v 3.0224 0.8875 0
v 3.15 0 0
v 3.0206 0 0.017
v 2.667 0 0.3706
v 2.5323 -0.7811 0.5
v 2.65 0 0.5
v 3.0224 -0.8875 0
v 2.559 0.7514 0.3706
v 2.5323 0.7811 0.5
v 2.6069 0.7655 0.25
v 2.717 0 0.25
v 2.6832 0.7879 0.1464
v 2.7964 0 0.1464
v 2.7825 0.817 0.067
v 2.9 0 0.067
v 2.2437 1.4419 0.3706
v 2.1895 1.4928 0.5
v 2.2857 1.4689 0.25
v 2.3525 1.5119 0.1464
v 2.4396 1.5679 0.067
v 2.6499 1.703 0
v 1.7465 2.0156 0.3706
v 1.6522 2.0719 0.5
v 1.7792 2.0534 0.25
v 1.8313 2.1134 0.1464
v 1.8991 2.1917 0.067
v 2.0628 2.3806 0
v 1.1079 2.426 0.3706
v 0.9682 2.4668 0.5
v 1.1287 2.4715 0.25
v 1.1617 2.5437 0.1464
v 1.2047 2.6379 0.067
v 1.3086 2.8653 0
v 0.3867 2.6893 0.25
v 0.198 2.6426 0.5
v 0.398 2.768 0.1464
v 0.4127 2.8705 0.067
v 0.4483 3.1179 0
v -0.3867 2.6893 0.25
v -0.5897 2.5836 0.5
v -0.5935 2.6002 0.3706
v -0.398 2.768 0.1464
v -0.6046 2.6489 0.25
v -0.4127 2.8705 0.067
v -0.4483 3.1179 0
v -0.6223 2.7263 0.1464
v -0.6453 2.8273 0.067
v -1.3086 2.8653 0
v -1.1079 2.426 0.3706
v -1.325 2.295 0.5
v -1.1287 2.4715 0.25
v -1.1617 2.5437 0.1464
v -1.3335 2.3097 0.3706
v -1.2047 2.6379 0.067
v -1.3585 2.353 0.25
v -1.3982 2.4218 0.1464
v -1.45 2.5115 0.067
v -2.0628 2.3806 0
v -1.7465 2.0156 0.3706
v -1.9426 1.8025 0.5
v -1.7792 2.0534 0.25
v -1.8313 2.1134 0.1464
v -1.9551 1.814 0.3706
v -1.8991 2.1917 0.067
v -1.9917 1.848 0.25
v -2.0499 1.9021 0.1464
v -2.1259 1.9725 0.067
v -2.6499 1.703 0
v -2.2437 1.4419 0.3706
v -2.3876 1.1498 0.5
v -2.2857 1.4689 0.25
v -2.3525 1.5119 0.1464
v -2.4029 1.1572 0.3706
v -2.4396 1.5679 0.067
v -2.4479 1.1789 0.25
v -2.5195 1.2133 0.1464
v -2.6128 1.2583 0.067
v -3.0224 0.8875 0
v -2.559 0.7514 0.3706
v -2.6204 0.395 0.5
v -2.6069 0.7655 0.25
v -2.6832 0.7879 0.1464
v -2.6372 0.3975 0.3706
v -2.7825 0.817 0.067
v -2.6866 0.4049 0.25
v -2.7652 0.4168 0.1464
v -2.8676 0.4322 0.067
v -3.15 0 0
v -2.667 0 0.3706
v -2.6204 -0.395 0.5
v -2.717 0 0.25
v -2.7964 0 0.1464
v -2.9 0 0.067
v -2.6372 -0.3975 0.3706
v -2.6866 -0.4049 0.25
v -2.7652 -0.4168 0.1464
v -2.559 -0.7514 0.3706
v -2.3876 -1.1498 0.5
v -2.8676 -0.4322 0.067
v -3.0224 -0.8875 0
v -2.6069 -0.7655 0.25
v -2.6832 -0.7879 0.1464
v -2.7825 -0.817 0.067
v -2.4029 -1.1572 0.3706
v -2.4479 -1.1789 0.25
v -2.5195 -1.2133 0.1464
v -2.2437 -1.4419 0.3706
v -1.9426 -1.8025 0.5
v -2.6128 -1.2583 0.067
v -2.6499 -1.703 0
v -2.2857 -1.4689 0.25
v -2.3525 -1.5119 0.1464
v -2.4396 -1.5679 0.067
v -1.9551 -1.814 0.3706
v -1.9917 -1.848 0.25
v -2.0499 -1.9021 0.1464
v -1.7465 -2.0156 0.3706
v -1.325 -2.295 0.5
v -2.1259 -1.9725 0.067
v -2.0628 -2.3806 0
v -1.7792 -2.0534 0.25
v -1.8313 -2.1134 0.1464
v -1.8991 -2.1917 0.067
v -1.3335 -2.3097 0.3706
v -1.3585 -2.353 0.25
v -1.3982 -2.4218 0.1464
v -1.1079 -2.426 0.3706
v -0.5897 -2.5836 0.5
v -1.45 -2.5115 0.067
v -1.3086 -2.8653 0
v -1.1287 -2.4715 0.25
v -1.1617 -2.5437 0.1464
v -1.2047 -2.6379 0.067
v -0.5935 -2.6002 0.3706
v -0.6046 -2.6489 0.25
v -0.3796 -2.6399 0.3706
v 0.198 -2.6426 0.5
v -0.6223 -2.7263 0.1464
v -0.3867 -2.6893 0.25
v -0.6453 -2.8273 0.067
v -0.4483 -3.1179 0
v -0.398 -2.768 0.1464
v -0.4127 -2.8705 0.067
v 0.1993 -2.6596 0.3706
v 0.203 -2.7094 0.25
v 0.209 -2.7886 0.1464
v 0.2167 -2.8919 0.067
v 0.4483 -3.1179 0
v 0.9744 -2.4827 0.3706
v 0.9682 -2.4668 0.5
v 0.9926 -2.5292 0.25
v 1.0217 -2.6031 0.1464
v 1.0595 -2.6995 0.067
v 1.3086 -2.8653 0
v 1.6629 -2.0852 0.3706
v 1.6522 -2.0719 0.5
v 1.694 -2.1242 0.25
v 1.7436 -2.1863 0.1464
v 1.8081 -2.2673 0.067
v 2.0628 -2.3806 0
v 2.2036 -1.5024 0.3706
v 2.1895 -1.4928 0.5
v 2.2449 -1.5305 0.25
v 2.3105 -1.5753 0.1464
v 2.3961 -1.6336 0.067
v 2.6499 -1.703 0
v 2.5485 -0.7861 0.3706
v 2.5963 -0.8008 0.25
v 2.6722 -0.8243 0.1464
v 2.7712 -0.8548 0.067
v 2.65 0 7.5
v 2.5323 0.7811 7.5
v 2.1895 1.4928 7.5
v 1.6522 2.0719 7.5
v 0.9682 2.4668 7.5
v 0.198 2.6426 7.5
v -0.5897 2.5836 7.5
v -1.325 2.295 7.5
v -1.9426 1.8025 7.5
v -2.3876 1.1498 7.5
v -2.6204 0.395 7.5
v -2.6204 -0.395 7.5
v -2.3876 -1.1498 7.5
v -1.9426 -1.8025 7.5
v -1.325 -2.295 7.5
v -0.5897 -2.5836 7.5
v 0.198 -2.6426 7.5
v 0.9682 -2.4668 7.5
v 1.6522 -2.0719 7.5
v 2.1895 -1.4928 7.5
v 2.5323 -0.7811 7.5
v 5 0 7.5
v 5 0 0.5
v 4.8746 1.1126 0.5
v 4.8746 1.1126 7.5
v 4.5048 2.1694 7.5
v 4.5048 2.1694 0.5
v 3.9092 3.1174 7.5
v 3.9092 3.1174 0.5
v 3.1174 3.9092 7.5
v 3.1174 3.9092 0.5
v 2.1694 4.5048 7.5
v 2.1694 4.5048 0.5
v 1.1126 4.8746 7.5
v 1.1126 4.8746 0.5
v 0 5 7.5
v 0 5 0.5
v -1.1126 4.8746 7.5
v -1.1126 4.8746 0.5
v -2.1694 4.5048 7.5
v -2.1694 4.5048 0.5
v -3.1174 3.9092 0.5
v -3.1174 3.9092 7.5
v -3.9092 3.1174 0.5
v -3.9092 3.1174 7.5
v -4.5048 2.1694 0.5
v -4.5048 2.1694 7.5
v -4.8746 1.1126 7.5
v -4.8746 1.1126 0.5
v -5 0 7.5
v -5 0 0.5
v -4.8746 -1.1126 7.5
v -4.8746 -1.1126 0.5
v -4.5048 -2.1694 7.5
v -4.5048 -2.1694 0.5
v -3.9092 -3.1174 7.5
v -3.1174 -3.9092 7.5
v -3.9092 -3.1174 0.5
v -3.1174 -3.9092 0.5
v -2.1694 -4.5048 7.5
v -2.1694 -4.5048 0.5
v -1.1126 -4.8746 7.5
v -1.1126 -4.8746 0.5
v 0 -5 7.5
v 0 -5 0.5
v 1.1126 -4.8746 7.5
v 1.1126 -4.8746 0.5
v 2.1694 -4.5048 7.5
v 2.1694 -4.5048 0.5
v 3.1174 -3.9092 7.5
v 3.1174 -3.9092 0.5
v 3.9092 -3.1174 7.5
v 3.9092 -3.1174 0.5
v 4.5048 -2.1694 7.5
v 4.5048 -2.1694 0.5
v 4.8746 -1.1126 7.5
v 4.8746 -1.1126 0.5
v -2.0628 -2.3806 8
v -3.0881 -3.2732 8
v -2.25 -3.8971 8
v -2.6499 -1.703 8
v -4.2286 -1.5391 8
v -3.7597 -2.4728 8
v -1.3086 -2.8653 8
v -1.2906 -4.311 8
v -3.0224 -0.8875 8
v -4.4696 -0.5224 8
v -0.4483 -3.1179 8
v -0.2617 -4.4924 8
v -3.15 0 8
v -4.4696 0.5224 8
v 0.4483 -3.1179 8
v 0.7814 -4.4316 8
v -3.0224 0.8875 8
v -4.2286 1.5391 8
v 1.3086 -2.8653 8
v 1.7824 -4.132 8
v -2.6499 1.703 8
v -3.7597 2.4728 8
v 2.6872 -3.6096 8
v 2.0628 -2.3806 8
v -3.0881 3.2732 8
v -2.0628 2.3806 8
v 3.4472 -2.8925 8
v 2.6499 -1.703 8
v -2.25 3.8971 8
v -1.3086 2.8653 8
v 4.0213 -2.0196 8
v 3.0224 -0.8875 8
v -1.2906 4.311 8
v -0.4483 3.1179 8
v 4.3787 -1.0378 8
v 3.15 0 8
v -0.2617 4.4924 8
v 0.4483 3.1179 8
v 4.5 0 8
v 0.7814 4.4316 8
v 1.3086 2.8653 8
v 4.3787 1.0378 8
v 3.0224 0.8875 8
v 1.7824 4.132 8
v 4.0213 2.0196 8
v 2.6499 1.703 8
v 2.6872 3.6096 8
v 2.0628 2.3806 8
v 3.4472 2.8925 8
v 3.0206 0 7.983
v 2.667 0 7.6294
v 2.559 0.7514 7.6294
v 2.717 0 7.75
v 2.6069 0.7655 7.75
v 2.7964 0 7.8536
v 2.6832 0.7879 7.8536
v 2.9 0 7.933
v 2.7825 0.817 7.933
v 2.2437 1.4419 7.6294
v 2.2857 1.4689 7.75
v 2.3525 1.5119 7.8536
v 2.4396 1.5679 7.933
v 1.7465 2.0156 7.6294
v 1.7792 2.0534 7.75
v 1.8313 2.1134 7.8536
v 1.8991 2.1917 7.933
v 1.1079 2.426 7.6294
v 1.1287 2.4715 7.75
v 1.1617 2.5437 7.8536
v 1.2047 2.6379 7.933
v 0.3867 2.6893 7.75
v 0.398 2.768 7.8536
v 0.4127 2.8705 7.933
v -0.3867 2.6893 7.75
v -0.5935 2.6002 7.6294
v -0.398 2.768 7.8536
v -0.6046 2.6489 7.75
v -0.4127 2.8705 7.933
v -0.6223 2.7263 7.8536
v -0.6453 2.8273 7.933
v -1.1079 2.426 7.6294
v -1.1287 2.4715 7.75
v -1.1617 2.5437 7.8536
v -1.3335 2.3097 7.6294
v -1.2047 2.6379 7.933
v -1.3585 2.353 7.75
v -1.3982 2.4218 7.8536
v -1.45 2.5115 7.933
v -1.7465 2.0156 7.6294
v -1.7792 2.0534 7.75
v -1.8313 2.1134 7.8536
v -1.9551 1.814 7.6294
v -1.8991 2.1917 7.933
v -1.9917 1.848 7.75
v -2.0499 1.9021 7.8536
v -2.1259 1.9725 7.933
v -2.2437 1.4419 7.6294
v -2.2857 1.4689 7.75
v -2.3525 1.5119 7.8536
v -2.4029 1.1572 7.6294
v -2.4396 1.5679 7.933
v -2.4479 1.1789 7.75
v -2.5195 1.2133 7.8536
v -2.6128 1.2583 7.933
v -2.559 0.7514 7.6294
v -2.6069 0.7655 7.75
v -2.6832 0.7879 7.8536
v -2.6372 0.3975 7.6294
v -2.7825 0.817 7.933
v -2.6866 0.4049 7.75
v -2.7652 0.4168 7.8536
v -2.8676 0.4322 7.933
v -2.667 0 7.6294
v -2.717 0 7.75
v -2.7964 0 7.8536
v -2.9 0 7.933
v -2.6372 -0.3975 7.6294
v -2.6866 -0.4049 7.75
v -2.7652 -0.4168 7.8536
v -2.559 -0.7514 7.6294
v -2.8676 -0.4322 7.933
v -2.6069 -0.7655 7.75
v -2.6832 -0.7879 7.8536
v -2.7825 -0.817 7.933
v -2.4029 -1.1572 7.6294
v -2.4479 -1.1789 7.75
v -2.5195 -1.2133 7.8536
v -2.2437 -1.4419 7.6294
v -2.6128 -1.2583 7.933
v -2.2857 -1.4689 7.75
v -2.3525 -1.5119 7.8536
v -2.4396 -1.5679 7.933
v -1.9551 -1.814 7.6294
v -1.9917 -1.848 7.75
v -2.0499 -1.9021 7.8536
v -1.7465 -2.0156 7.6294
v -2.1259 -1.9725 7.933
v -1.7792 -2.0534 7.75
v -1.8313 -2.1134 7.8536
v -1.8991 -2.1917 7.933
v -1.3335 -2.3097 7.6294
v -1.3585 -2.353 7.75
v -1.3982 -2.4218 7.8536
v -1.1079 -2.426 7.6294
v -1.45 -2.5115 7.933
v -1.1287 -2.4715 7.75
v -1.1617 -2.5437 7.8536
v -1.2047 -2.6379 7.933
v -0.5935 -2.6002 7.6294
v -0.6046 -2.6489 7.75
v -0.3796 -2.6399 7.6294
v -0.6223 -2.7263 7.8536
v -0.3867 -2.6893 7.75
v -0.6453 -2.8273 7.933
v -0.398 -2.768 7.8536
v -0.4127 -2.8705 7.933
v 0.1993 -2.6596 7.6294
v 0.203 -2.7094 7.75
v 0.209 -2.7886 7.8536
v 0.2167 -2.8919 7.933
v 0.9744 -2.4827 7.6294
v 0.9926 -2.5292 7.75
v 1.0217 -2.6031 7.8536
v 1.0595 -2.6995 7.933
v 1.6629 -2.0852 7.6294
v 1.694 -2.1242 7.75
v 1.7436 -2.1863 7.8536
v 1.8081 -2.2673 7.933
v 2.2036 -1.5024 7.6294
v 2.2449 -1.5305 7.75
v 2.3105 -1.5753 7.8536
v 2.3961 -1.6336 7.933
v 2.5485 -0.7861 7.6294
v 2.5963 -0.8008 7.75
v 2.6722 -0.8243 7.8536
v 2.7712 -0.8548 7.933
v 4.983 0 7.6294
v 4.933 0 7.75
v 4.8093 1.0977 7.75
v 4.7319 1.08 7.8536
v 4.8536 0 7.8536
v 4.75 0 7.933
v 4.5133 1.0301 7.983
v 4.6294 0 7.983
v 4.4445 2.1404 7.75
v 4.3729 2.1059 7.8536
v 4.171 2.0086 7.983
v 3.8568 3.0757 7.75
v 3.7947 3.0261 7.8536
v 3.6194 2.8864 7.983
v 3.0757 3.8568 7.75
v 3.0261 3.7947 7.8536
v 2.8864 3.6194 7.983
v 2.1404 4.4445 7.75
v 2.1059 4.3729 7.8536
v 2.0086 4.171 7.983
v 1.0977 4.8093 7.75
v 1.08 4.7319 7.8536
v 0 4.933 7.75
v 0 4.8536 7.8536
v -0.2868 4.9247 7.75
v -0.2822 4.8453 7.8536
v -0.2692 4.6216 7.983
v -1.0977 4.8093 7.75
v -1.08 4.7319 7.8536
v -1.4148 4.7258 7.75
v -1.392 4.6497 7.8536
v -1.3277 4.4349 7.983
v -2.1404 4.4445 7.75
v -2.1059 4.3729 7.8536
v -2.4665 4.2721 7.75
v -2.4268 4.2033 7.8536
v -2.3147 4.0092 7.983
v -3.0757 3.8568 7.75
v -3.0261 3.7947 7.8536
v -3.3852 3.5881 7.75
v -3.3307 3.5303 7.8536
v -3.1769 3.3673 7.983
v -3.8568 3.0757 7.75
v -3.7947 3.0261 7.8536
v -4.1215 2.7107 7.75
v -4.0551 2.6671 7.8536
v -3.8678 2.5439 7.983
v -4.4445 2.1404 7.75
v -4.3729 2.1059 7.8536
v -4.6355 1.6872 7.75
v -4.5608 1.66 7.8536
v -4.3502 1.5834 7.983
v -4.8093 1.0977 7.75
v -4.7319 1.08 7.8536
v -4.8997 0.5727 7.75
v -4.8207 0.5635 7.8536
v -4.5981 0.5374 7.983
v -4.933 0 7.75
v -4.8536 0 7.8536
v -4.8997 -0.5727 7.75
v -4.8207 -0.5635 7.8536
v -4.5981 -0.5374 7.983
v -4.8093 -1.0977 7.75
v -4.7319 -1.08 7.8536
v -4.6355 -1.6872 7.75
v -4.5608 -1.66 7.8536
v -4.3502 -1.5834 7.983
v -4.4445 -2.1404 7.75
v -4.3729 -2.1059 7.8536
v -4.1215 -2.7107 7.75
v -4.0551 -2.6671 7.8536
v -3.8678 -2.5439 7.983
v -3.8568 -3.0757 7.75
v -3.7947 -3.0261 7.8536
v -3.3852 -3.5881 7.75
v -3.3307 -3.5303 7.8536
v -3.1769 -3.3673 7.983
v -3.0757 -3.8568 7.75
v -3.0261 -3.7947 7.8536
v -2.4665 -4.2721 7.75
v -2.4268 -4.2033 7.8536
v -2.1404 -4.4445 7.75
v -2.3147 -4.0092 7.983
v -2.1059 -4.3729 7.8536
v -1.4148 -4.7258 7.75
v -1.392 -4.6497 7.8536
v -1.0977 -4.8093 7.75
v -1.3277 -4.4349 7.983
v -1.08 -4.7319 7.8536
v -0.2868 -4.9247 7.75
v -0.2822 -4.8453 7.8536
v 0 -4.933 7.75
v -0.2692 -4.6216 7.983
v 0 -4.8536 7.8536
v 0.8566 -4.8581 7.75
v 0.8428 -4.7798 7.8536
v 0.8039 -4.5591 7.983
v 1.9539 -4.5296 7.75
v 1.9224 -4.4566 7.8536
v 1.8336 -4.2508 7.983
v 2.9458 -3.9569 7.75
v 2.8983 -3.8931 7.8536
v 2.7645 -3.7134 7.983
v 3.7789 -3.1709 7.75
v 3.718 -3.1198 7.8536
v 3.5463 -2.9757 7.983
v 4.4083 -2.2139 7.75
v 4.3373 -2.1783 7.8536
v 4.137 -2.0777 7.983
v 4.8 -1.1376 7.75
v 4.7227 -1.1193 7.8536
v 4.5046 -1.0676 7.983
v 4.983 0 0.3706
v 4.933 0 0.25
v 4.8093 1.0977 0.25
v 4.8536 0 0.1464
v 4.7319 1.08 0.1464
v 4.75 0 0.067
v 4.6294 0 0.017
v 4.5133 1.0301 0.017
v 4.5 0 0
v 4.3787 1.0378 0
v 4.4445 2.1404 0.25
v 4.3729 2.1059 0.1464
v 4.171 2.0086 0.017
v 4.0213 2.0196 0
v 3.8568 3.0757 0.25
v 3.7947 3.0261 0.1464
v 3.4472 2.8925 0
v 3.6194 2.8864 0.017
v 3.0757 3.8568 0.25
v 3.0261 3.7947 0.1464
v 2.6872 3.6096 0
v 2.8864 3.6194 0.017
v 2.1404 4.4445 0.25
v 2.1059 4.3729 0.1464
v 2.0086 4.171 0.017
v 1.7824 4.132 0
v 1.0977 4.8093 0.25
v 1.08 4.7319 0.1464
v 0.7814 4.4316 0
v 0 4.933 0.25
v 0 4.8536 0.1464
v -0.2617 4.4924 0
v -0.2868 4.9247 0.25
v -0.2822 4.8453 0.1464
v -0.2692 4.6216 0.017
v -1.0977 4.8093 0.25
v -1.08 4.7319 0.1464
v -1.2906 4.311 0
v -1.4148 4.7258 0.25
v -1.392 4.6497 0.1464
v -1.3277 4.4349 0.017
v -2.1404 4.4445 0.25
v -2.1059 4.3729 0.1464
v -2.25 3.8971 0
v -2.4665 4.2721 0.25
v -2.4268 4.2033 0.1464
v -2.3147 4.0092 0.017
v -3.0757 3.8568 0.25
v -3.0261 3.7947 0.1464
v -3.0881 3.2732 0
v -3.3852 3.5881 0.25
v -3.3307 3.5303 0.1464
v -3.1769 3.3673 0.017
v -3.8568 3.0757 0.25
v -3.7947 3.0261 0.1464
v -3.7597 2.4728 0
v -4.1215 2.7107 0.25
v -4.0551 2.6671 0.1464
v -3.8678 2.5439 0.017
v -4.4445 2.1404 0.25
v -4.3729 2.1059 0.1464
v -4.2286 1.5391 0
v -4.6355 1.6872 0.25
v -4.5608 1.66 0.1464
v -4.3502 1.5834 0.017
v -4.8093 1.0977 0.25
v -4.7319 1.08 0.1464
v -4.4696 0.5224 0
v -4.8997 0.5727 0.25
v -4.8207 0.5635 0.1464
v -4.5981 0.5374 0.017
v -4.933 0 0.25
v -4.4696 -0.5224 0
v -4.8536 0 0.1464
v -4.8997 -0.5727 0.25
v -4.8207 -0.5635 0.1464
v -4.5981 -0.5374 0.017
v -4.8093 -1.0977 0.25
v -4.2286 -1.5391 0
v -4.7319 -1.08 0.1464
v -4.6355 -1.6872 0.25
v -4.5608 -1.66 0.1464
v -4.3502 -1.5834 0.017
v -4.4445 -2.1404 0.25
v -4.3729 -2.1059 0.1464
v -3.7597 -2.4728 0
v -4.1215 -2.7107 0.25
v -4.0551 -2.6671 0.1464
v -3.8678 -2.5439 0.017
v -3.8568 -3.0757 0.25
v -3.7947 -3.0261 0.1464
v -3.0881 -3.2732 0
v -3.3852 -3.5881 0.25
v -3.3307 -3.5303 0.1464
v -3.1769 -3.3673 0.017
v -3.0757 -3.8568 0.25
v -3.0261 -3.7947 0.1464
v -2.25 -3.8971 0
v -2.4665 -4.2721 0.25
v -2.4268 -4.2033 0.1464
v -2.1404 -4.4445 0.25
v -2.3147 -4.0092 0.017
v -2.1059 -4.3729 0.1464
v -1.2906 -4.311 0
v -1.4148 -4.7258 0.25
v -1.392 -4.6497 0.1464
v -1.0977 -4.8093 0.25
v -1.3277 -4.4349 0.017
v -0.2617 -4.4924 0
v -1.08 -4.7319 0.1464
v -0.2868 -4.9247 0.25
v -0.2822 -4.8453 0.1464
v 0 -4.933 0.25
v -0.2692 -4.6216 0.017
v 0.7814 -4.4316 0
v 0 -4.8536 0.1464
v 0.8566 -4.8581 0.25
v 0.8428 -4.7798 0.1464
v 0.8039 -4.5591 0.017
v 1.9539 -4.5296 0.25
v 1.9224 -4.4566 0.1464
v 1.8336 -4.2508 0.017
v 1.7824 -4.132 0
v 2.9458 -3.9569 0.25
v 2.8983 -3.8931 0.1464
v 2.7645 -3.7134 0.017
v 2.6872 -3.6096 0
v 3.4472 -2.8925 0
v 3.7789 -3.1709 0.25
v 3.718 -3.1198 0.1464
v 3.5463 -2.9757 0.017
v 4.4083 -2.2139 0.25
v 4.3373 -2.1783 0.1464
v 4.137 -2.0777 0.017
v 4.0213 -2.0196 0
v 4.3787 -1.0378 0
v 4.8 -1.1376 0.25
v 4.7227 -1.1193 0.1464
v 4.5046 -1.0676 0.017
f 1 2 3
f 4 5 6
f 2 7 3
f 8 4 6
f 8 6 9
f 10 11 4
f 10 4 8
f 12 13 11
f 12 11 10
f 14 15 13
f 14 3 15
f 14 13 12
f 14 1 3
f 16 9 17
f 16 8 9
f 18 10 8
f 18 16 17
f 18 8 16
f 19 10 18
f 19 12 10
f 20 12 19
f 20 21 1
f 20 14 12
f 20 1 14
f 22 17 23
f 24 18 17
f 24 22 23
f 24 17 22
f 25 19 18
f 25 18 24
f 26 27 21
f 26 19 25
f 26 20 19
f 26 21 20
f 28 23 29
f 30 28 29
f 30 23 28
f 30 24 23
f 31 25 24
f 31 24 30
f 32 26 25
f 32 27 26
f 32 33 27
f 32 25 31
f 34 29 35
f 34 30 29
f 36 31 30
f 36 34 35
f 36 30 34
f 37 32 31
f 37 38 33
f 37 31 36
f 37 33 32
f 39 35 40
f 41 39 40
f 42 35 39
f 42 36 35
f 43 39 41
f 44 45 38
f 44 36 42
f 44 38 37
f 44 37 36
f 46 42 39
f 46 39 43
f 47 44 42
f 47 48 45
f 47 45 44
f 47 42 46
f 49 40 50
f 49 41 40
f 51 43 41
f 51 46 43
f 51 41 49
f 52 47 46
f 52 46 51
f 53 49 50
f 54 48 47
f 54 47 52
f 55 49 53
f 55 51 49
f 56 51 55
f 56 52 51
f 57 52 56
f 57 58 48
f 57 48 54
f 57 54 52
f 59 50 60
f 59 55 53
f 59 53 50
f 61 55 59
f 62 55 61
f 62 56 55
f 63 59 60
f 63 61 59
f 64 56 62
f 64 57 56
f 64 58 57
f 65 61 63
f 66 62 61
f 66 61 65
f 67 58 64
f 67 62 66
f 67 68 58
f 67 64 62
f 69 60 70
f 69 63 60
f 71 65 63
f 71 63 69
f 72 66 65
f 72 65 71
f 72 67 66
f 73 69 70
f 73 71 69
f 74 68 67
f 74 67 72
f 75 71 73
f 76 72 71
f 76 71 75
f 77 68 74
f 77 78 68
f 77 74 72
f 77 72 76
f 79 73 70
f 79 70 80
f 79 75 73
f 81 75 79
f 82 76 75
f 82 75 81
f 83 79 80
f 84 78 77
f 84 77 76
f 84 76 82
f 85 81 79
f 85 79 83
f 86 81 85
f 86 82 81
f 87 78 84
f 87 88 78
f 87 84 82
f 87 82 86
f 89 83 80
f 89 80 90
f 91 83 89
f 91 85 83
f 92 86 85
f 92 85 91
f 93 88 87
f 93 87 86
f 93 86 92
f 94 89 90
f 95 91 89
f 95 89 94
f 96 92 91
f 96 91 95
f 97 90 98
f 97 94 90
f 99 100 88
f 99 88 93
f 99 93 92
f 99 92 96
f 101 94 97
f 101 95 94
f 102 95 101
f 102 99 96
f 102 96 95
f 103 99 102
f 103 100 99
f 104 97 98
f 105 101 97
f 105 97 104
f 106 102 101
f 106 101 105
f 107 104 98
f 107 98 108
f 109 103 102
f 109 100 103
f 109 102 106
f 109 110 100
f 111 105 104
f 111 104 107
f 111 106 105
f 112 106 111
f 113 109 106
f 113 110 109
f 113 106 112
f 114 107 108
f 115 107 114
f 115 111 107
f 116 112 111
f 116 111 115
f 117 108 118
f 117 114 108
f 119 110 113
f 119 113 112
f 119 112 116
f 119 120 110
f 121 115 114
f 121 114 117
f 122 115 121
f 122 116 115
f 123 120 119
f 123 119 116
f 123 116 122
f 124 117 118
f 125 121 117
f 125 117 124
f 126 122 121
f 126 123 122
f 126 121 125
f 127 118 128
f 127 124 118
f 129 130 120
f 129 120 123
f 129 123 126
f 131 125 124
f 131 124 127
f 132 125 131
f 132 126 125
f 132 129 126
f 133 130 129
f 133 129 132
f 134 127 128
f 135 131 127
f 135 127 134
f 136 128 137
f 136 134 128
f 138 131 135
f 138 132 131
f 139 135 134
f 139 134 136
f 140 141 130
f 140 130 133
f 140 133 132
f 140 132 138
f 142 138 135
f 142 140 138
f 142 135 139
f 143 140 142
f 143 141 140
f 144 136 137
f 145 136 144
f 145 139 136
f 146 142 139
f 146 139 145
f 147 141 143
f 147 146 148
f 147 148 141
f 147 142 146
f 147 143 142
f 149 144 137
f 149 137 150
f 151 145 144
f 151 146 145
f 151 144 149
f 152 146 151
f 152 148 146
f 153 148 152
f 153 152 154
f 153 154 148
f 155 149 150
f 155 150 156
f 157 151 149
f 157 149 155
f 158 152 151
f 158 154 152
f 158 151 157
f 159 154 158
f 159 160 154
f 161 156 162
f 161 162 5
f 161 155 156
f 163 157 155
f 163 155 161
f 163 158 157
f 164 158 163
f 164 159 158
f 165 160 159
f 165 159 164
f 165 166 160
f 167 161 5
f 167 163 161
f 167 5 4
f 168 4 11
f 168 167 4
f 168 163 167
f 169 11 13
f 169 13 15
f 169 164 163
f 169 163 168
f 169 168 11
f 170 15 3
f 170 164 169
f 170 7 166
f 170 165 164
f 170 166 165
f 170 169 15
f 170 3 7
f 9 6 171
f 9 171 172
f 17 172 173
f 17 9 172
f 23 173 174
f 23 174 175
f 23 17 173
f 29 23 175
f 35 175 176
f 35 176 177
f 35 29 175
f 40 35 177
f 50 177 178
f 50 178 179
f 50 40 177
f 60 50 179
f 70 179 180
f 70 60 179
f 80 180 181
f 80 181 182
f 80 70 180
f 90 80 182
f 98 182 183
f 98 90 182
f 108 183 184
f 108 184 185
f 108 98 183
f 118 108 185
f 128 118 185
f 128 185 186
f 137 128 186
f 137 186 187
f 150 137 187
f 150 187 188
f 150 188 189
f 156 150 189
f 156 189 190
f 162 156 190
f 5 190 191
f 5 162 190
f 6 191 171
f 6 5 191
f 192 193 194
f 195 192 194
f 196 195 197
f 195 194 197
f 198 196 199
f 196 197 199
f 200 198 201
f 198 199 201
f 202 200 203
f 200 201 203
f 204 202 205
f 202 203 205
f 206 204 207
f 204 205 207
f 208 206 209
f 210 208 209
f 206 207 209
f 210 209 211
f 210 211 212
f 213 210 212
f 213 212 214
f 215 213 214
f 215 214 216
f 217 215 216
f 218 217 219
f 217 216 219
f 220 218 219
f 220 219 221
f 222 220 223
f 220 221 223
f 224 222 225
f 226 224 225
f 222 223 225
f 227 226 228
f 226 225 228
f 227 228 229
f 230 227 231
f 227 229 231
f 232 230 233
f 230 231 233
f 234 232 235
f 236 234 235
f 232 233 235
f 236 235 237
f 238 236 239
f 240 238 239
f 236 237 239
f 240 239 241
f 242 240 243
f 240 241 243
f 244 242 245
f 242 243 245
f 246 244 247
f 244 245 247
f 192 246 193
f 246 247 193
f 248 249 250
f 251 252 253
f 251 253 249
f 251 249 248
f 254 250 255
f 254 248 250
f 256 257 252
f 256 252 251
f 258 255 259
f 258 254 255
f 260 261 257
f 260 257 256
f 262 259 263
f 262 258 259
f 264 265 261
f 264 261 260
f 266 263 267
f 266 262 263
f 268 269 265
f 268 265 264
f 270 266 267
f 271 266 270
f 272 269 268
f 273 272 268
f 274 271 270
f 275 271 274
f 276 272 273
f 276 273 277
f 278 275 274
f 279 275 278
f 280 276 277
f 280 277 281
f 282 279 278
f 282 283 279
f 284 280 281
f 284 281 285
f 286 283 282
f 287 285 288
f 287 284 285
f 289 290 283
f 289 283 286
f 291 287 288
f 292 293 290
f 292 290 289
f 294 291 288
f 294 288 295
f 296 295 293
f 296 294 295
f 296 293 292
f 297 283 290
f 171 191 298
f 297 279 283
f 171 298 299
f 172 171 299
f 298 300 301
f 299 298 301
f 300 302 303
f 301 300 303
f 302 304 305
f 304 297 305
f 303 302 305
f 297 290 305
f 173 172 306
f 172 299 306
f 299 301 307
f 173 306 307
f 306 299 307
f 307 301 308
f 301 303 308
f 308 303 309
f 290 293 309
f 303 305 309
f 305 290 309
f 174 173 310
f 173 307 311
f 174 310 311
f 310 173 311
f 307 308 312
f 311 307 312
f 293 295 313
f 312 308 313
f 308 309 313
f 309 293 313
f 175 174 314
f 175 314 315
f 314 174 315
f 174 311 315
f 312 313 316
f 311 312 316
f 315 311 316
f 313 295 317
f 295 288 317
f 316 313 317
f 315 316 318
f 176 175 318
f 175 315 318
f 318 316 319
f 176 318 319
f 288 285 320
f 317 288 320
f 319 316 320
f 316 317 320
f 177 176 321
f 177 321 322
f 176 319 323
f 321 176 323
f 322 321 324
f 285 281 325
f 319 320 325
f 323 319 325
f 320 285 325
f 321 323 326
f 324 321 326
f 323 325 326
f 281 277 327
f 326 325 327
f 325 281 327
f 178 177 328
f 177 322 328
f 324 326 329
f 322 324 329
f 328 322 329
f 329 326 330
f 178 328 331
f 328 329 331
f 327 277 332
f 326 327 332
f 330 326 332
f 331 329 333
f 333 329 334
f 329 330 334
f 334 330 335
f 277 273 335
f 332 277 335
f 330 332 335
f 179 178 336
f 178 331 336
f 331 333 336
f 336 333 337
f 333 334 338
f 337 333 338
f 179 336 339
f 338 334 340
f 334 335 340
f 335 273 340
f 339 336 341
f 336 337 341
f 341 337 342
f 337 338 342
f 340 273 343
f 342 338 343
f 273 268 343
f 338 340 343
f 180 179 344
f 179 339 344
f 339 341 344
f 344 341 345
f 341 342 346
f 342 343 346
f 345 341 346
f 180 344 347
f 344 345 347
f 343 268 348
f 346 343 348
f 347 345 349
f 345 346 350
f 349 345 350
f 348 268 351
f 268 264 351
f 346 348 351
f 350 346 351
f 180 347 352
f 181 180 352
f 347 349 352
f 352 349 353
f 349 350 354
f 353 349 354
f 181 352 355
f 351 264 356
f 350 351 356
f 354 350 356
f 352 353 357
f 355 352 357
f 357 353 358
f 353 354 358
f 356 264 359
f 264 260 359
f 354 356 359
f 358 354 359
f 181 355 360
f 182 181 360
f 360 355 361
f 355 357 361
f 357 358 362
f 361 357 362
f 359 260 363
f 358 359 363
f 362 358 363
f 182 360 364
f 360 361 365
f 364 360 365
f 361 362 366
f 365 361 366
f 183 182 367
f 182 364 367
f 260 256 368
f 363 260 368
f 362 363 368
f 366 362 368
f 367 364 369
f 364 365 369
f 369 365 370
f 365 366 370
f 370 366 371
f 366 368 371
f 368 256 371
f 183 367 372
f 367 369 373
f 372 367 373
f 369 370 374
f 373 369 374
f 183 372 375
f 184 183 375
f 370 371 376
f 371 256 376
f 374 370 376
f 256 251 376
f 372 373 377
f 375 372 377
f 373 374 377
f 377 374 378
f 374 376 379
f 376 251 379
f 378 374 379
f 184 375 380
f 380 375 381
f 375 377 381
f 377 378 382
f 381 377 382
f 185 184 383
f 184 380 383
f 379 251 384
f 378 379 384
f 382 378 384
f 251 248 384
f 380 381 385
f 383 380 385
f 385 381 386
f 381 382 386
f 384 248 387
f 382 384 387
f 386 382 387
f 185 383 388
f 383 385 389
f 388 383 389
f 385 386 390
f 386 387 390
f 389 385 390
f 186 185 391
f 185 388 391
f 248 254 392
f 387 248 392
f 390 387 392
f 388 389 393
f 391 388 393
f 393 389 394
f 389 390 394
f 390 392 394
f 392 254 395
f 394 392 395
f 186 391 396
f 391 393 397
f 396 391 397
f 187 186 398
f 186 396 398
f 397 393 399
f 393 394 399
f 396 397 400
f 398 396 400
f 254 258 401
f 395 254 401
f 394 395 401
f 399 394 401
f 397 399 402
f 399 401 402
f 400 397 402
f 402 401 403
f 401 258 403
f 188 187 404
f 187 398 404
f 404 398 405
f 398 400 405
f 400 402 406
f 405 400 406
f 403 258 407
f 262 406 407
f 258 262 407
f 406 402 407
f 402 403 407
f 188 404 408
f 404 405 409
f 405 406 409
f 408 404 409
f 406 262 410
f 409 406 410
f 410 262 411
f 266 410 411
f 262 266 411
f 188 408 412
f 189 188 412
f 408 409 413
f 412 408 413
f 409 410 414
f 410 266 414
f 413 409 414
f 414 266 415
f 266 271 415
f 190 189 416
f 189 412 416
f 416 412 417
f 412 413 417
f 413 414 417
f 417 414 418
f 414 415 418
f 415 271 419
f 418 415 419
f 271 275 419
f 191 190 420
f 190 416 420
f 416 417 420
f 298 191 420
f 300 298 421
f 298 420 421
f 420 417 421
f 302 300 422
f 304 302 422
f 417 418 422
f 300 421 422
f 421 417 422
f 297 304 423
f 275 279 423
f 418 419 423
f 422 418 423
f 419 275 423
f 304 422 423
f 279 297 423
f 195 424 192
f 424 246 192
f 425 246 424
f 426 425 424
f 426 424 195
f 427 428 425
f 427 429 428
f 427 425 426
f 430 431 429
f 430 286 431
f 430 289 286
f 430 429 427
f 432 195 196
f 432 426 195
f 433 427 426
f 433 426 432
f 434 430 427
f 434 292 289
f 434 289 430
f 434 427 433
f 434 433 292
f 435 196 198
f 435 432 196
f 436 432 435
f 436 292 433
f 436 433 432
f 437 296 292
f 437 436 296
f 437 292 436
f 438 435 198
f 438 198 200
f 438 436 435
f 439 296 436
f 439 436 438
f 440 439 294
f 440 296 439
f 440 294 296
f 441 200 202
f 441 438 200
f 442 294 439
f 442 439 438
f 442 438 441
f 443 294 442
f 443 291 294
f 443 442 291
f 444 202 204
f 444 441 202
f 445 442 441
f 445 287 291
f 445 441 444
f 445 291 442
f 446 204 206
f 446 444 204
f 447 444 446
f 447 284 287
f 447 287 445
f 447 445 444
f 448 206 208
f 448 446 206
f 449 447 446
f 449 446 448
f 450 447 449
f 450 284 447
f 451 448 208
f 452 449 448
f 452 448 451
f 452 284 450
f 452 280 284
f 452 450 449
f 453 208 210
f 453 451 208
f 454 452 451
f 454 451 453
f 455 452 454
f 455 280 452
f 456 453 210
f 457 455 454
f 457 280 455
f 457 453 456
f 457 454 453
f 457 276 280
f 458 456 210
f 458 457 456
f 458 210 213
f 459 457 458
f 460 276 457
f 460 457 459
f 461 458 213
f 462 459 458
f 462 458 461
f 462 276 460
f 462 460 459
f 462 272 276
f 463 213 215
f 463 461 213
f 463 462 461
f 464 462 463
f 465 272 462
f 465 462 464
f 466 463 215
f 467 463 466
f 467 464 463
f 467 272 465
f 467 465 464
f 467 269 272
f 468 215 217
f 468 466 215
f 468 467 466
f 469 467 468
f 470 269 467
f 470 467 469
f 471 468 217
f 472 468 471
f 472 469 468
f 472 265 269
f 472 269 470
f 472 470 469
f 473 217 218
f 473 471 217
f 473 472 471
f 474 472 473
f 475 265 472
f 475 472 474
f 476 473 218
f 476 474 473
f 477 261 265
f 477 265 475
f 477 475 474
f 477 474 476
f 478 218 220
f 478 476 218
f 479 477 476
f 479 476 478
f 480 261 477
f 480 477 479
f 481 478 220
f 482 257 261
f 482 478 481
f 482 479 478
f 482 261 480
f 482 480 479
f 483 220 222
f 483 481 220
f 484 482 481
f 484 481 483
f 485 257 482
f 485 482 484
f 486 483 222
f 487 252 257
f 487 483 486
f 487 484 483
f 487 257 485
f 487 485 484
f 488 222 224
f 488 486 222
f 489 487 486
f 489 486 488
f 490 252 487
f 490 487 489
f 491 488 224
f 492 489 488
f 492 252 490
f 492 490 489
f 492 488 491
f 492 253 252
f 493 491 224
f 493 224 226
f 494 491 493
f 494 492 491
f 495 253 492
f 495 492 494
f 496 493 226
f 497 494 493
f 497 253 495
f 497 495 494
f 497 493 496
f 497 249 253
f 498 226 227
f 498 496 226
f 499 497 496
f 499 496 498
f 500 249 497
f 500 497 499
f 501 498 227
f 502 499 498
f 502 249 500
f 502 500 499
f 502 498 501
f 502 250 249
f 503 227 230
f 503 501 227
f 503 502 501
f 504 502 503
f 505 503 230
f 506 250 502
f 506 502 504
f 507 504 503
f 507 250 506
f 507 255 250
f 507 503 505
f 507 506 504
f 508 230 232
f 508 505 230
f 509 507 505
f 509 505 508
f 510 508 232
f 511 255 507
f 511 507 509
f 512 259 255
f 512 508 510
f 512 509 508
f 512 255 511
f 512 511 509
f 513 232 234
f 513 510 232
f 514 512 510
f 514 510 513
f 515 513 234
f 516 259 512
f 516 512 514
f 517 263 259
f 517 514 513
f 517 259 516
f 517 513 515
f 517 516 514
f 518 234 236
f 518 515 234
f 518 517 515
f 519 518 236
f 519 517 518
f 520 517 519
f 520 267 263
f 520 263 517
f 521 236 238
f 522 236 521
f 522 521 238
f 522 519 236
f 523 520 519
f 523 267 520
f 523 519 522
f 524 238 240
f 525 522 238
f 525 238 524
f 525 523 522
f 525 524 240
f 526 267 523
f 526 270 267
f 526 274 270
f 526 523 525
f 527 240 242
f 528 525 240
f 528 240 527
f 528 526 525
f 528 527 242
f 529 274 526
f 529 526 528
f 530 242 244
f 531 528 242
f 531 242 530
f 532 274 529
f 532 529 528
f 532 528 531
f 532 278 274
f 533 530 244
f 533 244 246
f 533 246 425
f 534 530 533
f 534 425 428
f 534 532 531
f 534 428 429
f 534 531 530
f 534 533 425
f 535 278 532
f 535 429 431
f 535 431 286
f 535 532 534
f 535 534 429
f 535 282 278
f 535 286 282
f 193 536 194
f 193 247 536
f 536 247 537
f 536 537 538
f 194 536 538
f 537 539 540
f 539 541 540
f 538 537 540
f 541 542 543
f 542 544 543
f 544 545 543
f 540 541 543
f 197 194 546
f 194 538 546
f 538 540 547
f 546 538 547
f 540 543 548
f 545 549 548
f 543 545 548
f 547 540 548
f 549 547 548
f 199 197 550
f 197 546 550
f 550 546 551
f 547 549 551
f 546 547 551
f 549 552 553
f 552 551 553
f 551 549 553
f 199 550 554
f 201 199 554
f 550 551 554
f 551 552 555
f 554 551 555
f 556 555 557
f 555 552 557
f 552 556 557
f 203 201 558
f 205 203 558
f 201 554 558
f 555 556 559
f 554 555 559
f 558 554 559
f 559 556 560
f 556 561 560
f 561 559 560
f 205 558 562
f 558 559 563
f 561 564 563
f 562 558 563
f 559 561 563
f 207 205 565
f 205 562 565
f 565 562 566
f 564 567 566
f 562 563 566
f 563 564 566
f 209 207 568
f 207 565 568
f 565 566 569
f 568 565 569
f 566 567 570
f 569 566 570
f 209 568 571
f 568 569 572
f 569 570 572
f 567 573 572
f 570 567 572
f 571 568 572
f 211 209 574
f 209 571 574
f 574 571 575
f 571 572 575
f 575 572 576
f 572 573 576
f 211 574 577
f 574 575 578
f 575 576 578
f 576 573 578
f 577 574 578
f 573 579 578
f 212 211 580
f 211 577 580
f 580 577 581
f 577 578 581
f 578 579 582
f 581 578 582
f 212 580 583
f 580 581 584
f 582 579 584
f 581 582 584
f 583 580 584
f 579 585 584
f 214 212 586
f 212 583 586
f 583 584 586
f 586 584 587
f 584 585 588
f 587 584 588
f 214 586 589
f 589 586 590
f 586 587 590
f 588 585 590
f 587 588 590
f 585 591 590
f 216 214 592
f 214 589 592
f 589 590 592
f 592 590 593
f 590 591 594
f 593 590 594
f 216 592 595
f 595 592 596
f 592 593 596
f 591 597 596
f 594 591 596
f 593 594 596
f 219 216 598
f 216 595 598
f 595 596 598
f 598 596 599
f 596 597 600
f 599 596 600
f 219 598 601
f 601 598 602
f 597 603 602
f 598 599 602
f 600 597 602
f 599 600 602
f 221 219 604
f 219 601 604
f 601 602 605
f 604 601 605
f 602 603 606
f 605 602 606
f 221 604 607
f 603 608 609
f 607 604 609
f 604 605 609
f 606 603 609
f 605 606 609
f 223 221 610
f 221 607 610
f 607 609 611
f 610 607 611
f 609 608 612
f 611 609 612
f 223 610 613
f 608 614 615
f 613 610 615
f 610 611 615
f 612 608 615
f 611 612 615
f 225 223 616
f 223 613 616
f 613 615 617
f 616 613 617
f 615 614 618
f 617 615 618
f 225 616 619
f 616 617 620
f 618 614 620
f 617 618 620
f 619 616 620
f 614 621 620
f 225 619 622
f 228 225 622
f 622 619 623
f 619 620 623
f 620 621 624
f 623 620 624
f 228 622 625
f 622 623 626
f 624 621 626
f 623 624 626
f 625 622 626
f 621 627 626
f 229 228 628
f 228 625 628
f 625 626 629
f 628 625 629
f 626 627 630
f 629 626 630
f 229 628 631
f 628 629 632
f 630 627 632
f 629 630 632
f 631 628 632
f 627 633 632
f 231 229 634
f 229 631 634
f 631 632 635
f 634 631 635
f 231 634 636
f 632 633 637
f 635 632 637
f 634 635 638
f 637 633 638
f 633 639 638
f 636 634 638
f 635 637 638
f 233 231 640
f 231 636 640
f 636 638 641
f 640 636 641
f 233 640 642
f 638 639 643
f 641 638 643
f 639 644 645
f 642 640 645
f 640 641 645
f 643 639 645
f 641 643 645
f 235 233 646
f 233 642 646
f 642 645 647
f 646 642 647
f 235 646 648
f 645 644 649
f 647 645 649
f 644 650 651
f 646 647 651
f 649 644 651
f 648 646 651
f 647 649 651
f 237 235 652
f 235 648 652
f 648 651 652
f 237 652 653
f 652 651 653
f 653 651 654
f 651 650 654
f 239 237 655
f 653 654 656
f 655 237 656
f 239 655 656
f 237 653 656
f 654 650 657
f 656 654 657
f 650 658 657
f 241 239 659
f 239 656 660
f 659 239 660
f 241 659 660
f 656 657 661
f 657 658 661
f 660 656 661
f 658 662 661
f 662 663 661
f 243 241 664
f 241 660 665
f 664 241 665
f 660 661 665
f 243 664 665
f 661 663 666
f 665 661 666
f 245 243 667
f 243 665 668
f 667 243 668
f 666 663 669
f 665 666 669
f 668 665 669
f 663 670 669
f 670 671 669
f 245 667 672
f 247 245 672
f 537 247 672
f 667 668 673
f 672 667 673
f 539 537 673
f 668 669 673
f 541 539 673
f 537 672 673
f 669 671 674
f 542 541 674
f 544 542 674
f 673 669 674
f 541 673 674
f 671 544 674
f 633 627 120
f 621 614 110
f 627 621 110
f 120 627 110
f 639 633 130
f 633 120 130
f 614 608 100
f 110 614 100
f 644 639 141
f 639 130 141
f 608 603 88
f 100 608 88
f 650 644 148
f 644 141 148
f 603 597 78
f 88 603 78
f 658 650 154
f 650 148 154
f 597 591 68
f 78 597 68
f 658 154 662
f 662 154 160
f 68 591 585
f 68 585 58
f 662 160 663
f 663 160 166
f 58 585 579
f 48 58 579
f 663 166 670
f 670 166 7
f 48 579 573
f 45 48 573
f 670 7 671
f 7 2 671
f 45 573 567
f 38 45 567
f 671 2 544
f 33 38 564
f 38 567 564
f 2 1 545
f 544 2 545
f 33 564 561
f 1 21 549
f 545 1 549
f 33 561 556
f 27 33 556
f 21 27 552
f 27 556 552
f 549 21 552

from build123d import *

# Parameters (mm, degrees)
SKETCH1_R    = 5
SKETCH1_R_2  = 2.65
SPACER_DEPTH = 8
FILLET1_R    = 0.5


with BuildPart() as part:
    # Sketch1 → spacer (new body)
    with BuildSketch(Plane.XY):
        Circle(SKETCH1_R)
        Circle(SKETCH1_R_2, mode=Mode.SUBTRACT)
    extrude(amount=SPACER_DEPTH)

    # Fillet1
    fillet1_edges = [part.edges().sort_by_distance(p)[0] for p in [
        (-5, 0, 0),
        (-5, 0, 8),
        (-2.65, 0, 0),
        (-2.65, 0, 8),
    ]]
    fillet(fillet1_edges, radius=FILLET1_R)


solid = part.part
